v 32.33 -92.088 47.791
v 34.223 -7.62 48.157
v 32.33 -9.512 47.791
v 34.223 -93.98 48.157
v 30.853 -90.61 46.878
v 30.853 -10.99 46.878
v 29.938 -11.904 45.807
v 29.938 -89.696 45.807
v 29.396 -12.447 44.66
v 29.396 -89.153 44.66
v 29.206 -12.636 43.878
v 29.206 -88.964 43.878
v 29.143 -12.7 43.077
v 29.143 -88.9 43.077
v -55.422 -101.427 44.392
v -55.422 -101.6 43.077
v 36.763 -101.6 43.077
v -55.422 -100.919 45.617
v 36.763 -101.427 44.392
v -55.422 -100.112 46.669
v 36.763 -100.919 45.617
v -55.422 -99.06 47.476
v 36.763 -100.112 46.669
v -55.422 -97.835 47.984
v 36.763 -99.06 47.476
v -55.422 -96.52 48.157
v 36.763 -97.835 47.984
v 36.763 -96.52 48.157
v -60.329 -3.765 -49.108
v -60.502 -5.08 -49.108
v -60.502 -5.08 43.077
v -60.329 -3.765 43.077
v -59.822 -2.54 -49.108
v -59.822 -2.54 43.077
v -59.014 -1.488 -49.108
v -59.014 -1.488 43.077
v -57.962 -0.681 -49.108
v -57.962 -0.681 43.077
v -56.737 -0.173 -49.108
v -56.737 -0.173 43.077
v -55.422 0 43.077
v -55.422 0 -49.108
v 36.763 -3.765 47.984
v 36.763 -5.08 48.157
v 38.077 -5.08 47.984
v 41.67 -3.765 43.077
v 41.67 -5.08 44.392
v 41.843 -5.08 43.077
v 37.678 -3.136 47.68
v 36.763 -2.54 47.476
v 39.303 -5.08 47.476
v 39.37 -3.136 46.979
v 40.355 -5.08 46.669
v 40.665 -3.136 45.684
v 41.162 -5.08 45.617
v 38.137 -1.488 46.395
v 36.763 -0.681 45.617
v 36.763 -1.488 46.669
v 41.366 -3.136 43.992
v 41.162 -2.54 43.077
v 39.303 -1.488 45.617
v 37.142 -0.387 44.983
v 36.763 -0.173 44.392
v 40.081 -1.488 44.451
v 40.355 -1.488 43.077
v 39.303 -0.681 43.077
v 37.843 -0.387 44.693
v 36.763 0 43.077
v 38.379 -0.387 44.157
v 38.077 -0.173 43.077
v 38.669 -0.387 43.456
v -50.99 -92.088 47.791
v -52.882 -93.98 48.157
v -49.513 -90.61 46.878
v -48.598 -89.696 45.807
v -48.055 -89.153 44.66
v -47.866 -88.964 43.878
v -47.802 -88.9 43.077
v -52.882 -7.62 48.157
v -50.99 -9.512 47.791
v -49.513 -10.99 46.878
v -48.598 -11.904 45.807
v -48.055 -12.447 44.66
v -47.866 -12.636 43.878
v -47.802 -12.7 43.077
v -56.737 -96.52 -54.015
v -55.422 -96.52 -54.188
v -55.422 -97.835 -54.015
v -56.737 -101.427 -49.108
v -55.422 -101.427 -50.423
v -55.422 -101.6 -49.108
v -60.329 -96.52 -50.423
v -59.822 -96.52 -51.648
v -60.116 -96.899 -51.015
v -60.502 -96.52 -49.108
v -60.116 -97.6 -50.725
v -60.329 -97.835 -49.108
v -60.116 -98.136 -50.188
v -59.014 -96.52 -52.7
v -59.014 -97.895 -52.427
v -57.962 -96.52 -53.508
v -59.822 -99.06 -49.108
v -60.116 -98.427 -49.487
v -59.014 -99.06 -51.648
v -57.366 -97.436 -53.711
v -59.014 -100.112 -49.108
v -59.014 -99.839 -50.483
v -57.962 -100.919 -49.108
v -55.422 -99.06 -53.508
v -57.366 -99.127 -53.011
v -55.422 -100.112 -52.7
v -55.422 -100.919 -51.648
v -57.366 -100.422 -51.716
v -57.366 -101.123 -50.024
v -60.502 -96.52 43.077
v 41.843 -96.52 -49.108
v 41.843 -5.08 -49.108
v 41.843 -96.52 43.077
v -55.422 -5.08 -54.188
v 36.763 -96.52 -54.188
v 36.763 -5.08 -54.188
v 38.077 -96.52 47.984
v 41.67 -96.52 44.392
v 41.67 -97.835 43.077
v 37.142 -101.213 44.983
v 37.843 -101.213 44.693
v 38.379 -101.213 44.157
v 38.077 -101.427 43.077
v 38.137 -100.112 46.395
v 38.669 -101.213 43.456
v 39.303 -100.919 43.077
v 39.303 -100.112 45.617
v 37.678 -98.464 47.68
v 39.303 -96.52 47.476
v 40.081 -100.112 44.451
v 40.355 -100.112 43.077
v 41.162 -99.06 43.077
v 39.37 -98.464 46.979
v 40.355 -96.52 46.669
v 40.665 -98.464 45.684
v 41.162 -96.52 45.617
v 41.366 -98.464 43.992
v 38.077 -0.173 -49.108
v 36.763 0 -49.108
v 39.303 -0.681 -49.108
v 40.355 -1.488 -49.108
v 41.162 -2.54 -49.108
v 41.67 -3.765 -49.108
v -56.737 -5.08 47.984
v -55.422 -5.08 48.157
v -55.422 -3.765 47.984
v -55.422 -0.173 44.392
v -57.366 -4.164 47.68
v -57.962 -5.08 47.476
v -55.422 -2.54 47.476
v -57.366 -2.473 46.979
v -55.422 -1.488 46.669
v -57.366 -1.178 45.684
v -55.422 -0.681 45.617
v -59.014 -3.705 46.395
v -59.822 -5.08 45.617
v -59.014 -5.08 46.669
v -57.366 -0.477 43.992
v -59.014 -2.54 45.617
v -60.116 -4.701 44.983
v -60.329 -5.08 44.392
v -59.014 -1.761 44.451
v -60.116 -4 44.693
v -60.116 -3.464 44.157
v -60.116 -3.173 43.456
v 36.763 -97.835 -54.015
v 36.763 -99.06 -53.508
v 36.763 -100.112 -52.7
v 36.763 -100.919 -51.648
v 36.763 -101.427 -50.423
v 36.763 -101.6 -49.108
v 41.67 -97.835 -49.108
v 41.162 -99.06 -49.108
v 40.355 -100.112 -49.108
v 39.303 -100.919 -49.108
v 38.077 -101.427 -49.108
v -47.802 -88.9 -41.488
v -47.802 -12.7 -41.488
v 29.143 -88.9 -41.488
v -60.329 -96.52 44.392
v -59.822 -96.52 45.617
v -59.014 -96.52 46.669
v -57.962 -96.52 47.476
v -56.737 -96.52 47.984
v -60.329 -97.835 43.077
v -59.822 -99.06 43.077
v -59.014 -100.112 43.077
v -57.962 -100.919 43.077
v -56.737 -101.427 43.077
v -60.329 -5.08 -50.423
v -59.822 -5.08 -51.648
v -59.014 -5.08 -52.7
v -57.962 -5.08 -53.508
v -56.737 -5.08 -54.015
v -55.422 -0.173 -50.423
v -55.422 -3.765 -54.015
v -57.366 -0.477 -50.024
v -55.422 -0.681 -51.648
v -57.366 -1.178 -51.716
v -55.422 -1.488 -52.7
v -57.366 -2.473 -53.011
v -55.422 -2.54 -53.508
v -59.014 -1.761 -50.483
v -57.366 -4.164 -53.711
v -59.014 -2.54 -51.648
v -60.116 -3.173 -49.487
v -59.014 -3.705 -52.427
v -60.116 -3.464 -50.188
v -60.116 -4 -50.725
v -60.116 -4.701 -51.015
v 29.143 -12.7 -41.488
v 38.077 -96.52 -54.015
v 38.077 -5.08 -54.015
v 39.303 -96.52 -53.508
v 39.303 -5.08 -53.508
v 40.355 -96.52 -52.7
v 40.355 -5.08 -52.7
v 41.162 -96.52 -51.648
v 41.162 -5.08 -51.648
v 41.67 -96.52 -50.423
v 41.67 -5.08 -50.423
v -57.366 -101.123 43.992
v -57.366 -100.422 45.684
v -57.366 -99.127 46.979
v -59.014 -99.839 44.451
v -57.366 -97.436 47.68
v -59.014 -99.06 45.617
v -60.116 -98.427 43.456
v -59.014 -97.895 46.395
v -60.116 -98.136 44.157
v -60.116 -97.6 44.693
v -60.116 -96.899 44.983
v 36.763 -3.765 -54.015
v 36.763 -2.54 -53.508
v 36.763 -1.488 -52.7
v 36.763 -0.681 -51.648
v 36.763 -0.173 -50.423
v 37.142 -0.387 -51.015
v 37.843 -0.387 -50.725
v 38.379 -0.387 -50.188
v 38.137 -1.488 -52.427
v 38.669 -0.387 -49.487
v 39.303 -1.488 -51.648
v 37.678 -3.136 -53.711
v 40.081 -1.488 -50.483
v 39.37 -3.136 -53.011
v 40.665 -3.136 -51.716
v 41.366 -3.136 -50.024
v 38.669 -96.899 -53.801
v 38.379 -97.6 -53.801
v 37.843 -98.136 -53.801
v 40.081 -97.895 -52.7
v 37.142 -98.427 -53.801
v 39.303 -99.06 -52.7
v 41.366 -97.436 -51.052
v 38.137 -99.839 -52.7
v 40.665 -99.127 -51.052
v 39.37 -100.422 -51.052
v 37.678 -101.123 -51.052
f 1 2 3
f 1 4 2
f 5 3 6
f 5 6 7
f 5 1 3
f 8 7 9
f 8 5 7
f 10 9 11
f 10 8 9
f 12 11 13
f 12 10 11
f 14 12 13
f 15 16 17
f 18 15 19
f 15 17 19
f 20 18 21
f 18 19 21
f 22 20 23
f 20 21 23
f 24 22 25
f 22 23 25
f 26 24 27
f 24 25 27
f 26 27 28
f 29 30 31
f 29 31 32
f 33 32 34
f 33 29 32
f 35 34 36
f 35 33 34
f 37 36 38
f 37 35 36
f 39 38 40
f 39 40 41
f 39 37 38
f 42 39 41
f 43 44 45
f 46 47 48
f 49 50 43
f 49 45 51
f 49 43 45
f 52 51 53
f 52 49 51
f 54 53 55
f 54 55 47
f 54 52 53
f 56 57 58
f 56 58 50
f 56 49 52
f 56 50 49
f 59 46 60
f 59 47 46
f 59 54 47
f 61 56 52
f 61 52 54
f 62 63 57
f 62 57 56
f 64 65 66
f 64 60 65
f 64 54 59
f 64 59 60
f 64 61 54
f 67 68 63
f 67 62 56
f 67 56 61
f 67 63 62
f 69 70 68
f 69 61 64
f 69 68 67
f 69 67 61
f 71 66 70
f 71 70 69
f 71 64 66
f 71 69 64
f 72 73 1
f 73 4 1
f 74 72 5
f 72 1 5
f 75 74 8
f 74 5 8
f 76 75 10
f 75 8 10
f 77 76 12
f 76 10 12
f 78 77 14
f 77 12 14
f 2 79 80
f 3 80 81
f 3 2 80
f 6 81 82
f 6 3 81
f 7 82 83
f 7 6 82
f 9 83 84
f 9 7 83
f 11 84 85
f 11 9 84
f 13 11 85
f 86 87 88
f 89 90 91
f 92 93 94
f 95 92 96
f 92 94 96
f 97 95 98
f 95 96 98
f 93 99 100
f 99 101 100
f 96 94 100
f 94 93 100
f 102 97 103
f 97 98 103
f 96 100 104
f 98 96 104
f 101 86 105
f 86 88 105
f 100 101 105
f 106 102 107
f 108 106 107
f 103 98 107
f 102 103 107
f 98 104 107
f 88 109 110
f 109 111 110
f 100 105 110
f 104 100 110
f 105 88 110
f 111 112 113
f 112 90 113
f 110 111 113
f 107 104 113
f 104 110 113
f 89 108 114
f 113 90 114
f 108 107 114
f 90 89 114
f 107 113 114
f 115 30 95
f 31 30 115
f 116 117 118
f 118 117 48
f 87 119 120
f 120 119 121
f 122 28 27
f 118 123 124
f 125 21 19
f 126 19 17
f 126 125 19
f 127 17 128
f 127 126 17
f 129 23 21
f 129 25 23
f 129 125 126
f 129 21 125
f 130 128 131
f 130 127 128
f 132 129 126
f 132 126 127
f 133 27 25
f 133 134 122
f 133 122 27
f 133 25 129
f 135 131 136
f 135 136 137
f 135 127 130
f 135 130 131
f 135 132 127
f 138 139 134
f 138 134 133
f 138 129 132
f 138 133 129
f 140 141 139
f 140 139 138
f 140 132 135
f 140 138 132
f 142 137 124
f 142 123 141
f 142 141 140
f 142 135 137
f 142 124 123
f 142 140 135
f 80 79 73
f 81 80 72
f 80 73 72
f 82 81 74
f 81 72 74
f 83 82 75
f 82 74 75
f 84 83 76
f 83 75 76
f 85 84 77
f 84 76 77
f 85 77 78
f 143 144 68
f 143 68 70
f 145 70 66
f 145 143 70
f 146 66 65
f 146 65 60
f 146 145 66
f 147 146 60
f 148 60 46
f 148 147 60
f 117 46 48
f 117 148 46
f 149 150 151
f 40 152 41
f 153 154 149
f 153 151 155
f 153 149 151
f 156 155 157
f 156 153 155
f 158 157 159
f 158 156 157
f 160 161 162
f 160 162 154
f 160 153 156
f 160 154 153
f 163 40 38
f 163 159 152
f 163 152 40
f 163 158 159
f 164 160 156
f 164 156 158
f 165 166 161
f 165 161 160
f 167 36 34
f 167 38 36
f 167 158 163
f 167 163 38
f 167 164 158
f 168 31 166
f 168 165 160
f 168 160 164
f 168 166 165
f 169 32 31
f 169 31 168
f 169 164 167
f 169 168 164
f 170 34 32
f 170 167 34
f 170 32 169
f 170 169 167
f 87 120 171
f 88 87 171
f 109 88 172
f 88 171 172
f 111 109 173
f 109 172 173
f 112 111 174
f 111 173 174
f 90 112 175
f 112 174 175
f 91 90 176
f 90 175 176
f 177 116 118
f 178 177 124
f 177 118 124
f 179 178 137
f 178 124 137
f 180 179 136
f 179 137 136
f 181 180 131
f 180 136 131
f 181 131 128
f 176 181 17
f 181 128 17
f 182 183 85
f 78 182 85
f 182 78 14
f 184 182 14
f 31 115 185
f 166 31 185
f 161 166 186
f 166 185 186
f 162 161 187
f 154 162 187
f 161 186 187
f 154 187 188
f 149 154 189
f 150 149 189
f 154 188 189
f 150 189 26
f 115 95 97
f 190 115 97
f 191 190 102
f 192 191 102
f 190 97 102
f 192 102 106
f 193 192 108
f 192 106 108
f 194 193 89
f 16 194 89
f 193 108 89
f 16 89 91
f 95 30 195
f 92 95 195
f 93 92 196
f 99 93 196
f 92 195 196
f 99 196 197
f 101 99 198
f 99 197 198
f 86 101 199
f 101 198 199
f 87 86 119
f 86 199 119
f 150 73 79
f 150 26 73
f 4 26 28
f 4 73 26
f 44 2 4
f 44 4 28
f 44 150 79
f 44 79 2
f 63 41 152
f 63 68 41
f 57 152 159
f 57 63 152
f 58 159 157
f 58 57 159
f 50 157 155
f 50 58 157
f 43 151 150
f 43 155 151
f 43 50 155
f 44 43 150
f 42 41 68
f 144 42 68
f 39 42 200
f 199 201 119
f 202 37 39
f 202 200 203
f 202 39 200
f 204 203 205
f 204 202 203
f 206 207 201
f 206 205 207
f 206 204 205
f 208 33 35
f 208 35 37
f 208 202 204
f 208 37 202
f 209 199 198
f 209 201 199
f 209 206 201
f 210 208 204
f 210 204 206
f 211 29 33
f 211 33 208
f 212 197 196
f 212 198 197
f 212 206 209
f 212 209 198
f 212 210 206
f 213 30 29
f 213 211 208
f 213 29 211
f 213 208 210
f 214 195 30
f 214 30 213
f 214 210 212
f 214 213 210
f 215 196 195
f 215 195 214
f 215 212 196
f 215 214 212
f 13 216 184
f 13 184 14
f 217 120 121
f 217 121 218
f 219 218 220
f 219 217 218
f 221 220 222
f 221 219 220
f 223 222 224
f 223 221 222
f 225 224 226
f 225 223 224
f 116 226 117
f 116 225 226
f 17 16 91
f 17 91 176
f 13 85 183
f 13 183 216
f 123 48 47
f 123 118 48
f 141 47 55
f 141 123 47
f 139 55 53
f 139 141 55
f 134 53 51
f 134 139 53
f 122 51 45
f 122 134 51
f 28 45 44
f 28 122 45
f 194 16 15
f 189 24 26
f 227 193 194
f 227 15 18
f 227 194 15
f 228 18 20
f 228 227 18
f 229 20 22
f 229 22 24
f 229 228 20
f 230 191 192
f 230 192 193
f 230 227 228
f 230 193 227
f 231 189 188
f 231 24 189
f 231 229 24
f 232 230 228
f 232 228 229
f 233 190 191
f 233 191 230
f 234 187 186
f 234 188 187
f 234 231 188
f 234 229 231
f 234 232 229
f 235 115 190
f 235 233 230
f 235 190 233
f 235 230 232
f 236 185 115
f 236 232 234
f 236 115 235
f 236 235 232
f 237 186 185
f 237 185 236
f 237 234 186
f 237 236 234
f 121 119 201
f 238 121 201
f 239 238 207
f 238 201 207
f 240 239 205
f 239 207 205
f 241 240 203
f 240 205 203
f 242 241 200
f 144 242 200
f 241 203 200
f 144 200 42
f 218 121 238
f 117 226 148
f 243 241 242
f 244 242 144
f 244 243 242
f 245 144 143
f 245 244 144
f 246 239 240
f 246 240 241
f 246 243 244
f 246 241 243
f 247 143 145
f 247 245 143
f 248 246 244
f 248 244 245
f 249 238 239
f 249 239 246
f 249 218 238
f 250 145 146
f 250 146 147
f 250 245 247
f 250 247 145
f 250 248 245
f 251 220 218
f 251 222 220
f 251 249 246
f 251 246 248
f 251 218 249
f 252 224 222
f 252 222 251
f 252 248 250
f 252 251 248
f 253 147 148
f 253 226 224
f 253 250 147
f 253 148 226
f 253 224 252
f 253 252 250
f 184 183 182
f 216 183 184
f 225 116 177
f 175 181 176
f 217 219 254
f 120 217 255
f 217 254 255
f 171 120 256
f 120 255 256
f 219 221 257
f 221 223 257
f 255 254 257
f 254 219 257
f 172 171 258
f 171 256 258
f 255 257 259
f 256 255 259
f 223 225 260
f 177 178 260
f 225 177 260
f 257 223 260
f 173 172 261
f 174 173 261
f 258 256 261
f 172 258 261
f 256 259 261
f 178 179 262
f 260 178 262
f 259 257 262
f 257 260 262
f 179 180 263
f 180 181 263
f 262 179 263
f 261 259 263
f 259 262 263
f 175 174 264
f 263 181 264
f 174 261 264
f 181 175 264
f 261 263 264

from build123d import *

# Parameters (mm, degrees)
F0_W         = 102.3449450731
F0_H         = 102.3449450731
F1_DEPTH     = 101.6
F2_T         = -12.7
F3_R         = 5.08
F4_T1_DEPTH  = 92.1849450731
F4_T3_DEPTH  = 92.1849450731
F4_T5_DEPTH  = 91.44
F4_S9_W      = 5.08
F4_S9_H      = 5.08
F4_T10_DEPTH = 5.08
F4_S15_W     = 5.08
F4_S15_H     = 5.08
F4_T16_DEPTH = 5.08
F4_S21_W     = 5.08
F4_S21_H     = 5.08
F4_T22_DEPTH = 5.08
F4_S27_W     = 5.08
F4_S27_H     = 5.08
F4_T28_DEPTH = 5.08
F4_T32_ANGLE = 90
F4_T34_ANGLE = 90


# Not quite as in the source:
# - a fillet or chamfer that OpenCascade refuses, or shapes differently, is made with other operations: its cross-section is extruded or revolved along the edge and cut away or added


with BuildPart() as f1:
    # F0 (on Front) → F1 (new body)
    with BuildSketch(Plane.XZ):
        with Locations((-9.3297921121, -3.0156895518)):
            Rectangle(F0_W, F0_H)
    extrude(amount=F1_DEPTH)

    # F2
    f2_openings = [f1.faces().sort_by_distance(p)[0] for p in [
        (-9.329792, -50.8, 48.156783),
    ]]
    offset(amount=F2_T, openings=f2_openings)

    # F3
    f3_edges = [f1.edges().sort_by_distance(p)[0] for p in [
        (41.84268, -50.8, 48.156783),
        (-9.329792, -101.6, 48.156783),
        (41.84268, -101.6, -3.01569),
        (41.84268, -50.8, -54.188162),
        (-9.329792, -101.6, -54.188162),
        (-9.329792, -88.9, 48.156783),
        (-60.502265, -50.8, 48.156783),
        (-9.329792, 0, 48.156783),
        (29.14268, -50.8, 48.156783),
        (-9.329792, -12.7, 48.156783),
        (-47.802265, -50.8, 48.156783),
    ]]
    fillet(f3_edges, radius=F3_R)

    # F4: fillet of radius 5.08 on 3 edges, made by hand

    # F4_s2 → F4_t1 (cut)
    with BuildSketch(Plane.YZ.offset(-55.4222646487)):
        with BuildLine():
            ThreePointArc((-5.08, -54.1881620884), (-1.4878975516, -52.7002645368), (0, -49.1081620884))
            Line((0, -49.1081620884), (0, -54.1881620884))
            Line((0, -54.1881620884), (-5.08, -54.1881620884))
        make_face()
    extrude(amount=F4_T1_DEPTH, mode=Mode.SUBTRACT)

    # F4_s4 → F4_t3 (cut)
    with BuildSketch(Plane.XY.offset(-49.1081620884)):
        with BuildLine():
            ThreePointArc((-60.5022646487, -5.08), (-59.0143670971, -1.4878975516), (-55.4222646487, 0))
            Line((-55.4222646487, 0), (-60.5022646487, 0))
            Line((-60.5022646487, 0), (-60.5022646487, -5.08))
        make_face()
        with BuildLine():
            ThreePointArc((-60.5022646487, -96.52), (-59.0143670971, -100.1121024484), (-55.4222646487, -101.6))
            Line((-55.4222646487, -101.6), (-60.5022646487, -101.6))
            Line((-60.5022646487, -101.6), (-60.5022646487, -96.52))
        make_face()
        with BuildLine():
            ThreePointArc((36.7626804245, 0), (40.3547828729, -1.4878975516), (41.8426804245, -5.08))
            Line((41.8426804245, -5.08), (41.8426804245, 0))
            Line((41.8426804245, 0), (36.7626804245, 0))
        make_face()
    extrude(amount=F4_T3_DEPTH, mode=Mode.SUBTRACT)

    # F4_s6 → F4_t5 (cut)
    with BuildSketch(Plane.XZ.offset(5.08)):
        with BuildLine():
            ThreePointArc((-60.5022646487, -49.1081620884), (-59.0143670971, -52.7002645368), (-55.4222646487, -54.1881620884))
            Line((-55.4222646487, -54.1881620884), (-60.5022646487, -54.1881620884))
            Line((-60.5022646487, -54.1881620884), (-60.5022646487, -49.1081620884))
        make_face()
    extrude(amount=F4_T5_DEPTH, mode=Mode.SUBTRACT)


with BuildPart() as f4_tool8:
    # F4_s9 → F4_t10 (new body)
    with BuildSketch(Plane.YZ.offset(-55.4222646487)):
        with Locations((-99.06, 45.6167829847)):
            Rectangle(F4_S9_W, F4_S9_H)
    extrude(amount=-F4_T10_DEPTH)

    # F4_s11 → F4_t12 (revolve, cut)
    with BuildSketch(Plane(origin=(-55.4222646487, -96.52, 43.0767829847), x_dir=(0, 0.7071067812, -0.7071067812), z_dir=(0, 0.7071067812, 0.7071067812))):
        with BuildLine():
            ThreePointArc((0, -5.08), (5.08, 0), (0, 5.08))
            Line((0, 5.08), (0, -5.08))
        make_face()
    revolve(axis=Axis((-55.4222646487, -96.52, 43.0767829847), (-1, 0, 0)), mode=Mode.SUBTRACT)


with BuildPart() as f1_1:
    add(f1.part)

    # F4_t7: cut F4_tool8
    add(f4_tool8.part, mode=Mode.SUBTRACT)


with BuildPart() as f4_tool14:
    # F4_s15 → F4_t16 (new body)
    with BuildSketch(Plane.YZ.offset(-55.4222646487)):
        with Locations((-2.54, 45.6167829847)):
            Rectangle(F4_S15_W, F4_S15_H)
    extrude(amount=-F4_T16_DEPTH)

    # F4_s17 → F4_t18 (revolve, cut)
    with BuildSketch(Plane(origin=(-55.4222646487, -5.08, 43.0767829847), x_dir=(0, -0.7071067812, -0.7071067812), z_dir=(0, 0.7071067812, -0.7071067812))):
        with BuildLine():
            ThreePointArc((0, -5.08), (5.08, 0), (0, 5.08))
            Line((0, 5.08), (0, -5.08))
        make_face()
    revolve(axis=Axis((-55.4222646487, -5.08, 43.0767829847), (-1, 0, 0)), mode=Mode.SUBTRACT)


with BuildPart() as f1_2:
    add(f1_1.part)

    # F4_t13: cut F4_tool14
    add(f4_tool14.part, mode=Mode.SUBTRACT)


with BuildPart() as f4_tool20:
    # F4_s21 → F4_t22 (new body)
    with BuildSketch(Plane.XZ.offset(5.08)):
        with Locations((39.3026804245, 45.6167829847)):
            Rectangle(F4_S21_W, F4_S21_H)
    extrude(amount=-F4_T22_DEPTH)

    # F4_s23 → F4_t24 (revolve, cut)
    with BuildSketch(Plane(origin=(36.7626804245, -5.08, 43.0767829847), x_dir=(-0.7071067812, 0, -0.7071067812), z_dir=(0.7071067812, 0, -0.7071067812))):
        with BuildLine():
            ThreePointArc((0, -5.08), (5.08, 0), (0, 5.08))
            Line((0, 5.08), (0, -5.08))
        make_face()
    revolve(axis=Axis((36.7626804245, -5.08, 43.0767829847), (0, 1, 0)), mode=Mode.SUBTRACT)


with BuildPart() as f1_3:
    add(f1_2.part)

    # F4_t19: cut F4_tool20
    add(f4_tool20.part, mode=Mode.SUBTRACT)


with BuildPart() as f4_tool26:
    # F4_s27 → F4_t28 (new body)
    with BuildSketch(Plane.YZ.offset(-55.4222646487)):
        with Locations((-2.54, -51.6481620884)):
            Rectangle(F4_S27_W, F4_S27_H)
    extrude(amount=-F4_T28_DEPTH)

    # F4_s29 → F4_t30 (revolve, cut)
    with BuildSketch(Plane(origin=(-55.4222646487, -5.08, -49.1081620884), x_dir=(0, -0.7071067812, 0.7071067812), z_dir=(0, -0.7071067812, -0.7071067812))):
        with BuildLine():
            ThreePointArc((0, -5.08), (5.08, 0), (0, 5.08))
            Line((0, 5.08), (0, -5.08))
        make_face()
    revolve(axis=Axis((-55.4222646487, -5.08, -49.1081620884), (-1, 0, 0)), mode=Mode.SUBTRACT)


with BuildPart() as f1_4:
    add(f1_3.part)

    # F4_t25: cut F4_tool26
    add(f4_tool26.part, mode=Mode.SUBTRACT)

    # F4_s31 → F4_t32 (revolve, cut)
    with BuildSketch(Plane.XZ.offset(96.52)):
        with BuildLine():
            ThreePointArc((-60.5022646487, -49.1081620884), (-59.0143670971, -52.7002645368), (-55.4222646487, -54.1881620884))
            Line((-55.4222646487, -54.1881620884), (-60.5022646487, -54.1881620884))
            Line((-60.5022646487, -54.1881620884), (-60.5022646487, -49.1081620884))
        make_face()
    revolve(axis=Axis((-60.5022646487, -96.52, -49.1081620884), (-1, 0, 0)), revolution_arc=F4_T32_ANGLE, mode=Mode.SUBTRACT)

    # F4_s33 → F4_t34 (revolve, cut)
    with BuildSketch(Plane.YZ.offset(36.7626804245)):
        with BuildLine():
            ThreePointArc((0, -49.1081620884), (-1.4878975516, -52.7002645368), (-5.08, -54.1881620884))
            Line((-5.08, -54.1881620884), (0, -54.1881620884))
            Line((0, -54.1881620884), (0, -49.1081620884))
        make_face()
    revolve(axis=Axis((36.7626804245, 0, -49.1081620884), (0, -1, 0)), revolution_arc=F4_T34_ANGLE, mode=Mode.SUBTRACT)


solid = f1_4.part
